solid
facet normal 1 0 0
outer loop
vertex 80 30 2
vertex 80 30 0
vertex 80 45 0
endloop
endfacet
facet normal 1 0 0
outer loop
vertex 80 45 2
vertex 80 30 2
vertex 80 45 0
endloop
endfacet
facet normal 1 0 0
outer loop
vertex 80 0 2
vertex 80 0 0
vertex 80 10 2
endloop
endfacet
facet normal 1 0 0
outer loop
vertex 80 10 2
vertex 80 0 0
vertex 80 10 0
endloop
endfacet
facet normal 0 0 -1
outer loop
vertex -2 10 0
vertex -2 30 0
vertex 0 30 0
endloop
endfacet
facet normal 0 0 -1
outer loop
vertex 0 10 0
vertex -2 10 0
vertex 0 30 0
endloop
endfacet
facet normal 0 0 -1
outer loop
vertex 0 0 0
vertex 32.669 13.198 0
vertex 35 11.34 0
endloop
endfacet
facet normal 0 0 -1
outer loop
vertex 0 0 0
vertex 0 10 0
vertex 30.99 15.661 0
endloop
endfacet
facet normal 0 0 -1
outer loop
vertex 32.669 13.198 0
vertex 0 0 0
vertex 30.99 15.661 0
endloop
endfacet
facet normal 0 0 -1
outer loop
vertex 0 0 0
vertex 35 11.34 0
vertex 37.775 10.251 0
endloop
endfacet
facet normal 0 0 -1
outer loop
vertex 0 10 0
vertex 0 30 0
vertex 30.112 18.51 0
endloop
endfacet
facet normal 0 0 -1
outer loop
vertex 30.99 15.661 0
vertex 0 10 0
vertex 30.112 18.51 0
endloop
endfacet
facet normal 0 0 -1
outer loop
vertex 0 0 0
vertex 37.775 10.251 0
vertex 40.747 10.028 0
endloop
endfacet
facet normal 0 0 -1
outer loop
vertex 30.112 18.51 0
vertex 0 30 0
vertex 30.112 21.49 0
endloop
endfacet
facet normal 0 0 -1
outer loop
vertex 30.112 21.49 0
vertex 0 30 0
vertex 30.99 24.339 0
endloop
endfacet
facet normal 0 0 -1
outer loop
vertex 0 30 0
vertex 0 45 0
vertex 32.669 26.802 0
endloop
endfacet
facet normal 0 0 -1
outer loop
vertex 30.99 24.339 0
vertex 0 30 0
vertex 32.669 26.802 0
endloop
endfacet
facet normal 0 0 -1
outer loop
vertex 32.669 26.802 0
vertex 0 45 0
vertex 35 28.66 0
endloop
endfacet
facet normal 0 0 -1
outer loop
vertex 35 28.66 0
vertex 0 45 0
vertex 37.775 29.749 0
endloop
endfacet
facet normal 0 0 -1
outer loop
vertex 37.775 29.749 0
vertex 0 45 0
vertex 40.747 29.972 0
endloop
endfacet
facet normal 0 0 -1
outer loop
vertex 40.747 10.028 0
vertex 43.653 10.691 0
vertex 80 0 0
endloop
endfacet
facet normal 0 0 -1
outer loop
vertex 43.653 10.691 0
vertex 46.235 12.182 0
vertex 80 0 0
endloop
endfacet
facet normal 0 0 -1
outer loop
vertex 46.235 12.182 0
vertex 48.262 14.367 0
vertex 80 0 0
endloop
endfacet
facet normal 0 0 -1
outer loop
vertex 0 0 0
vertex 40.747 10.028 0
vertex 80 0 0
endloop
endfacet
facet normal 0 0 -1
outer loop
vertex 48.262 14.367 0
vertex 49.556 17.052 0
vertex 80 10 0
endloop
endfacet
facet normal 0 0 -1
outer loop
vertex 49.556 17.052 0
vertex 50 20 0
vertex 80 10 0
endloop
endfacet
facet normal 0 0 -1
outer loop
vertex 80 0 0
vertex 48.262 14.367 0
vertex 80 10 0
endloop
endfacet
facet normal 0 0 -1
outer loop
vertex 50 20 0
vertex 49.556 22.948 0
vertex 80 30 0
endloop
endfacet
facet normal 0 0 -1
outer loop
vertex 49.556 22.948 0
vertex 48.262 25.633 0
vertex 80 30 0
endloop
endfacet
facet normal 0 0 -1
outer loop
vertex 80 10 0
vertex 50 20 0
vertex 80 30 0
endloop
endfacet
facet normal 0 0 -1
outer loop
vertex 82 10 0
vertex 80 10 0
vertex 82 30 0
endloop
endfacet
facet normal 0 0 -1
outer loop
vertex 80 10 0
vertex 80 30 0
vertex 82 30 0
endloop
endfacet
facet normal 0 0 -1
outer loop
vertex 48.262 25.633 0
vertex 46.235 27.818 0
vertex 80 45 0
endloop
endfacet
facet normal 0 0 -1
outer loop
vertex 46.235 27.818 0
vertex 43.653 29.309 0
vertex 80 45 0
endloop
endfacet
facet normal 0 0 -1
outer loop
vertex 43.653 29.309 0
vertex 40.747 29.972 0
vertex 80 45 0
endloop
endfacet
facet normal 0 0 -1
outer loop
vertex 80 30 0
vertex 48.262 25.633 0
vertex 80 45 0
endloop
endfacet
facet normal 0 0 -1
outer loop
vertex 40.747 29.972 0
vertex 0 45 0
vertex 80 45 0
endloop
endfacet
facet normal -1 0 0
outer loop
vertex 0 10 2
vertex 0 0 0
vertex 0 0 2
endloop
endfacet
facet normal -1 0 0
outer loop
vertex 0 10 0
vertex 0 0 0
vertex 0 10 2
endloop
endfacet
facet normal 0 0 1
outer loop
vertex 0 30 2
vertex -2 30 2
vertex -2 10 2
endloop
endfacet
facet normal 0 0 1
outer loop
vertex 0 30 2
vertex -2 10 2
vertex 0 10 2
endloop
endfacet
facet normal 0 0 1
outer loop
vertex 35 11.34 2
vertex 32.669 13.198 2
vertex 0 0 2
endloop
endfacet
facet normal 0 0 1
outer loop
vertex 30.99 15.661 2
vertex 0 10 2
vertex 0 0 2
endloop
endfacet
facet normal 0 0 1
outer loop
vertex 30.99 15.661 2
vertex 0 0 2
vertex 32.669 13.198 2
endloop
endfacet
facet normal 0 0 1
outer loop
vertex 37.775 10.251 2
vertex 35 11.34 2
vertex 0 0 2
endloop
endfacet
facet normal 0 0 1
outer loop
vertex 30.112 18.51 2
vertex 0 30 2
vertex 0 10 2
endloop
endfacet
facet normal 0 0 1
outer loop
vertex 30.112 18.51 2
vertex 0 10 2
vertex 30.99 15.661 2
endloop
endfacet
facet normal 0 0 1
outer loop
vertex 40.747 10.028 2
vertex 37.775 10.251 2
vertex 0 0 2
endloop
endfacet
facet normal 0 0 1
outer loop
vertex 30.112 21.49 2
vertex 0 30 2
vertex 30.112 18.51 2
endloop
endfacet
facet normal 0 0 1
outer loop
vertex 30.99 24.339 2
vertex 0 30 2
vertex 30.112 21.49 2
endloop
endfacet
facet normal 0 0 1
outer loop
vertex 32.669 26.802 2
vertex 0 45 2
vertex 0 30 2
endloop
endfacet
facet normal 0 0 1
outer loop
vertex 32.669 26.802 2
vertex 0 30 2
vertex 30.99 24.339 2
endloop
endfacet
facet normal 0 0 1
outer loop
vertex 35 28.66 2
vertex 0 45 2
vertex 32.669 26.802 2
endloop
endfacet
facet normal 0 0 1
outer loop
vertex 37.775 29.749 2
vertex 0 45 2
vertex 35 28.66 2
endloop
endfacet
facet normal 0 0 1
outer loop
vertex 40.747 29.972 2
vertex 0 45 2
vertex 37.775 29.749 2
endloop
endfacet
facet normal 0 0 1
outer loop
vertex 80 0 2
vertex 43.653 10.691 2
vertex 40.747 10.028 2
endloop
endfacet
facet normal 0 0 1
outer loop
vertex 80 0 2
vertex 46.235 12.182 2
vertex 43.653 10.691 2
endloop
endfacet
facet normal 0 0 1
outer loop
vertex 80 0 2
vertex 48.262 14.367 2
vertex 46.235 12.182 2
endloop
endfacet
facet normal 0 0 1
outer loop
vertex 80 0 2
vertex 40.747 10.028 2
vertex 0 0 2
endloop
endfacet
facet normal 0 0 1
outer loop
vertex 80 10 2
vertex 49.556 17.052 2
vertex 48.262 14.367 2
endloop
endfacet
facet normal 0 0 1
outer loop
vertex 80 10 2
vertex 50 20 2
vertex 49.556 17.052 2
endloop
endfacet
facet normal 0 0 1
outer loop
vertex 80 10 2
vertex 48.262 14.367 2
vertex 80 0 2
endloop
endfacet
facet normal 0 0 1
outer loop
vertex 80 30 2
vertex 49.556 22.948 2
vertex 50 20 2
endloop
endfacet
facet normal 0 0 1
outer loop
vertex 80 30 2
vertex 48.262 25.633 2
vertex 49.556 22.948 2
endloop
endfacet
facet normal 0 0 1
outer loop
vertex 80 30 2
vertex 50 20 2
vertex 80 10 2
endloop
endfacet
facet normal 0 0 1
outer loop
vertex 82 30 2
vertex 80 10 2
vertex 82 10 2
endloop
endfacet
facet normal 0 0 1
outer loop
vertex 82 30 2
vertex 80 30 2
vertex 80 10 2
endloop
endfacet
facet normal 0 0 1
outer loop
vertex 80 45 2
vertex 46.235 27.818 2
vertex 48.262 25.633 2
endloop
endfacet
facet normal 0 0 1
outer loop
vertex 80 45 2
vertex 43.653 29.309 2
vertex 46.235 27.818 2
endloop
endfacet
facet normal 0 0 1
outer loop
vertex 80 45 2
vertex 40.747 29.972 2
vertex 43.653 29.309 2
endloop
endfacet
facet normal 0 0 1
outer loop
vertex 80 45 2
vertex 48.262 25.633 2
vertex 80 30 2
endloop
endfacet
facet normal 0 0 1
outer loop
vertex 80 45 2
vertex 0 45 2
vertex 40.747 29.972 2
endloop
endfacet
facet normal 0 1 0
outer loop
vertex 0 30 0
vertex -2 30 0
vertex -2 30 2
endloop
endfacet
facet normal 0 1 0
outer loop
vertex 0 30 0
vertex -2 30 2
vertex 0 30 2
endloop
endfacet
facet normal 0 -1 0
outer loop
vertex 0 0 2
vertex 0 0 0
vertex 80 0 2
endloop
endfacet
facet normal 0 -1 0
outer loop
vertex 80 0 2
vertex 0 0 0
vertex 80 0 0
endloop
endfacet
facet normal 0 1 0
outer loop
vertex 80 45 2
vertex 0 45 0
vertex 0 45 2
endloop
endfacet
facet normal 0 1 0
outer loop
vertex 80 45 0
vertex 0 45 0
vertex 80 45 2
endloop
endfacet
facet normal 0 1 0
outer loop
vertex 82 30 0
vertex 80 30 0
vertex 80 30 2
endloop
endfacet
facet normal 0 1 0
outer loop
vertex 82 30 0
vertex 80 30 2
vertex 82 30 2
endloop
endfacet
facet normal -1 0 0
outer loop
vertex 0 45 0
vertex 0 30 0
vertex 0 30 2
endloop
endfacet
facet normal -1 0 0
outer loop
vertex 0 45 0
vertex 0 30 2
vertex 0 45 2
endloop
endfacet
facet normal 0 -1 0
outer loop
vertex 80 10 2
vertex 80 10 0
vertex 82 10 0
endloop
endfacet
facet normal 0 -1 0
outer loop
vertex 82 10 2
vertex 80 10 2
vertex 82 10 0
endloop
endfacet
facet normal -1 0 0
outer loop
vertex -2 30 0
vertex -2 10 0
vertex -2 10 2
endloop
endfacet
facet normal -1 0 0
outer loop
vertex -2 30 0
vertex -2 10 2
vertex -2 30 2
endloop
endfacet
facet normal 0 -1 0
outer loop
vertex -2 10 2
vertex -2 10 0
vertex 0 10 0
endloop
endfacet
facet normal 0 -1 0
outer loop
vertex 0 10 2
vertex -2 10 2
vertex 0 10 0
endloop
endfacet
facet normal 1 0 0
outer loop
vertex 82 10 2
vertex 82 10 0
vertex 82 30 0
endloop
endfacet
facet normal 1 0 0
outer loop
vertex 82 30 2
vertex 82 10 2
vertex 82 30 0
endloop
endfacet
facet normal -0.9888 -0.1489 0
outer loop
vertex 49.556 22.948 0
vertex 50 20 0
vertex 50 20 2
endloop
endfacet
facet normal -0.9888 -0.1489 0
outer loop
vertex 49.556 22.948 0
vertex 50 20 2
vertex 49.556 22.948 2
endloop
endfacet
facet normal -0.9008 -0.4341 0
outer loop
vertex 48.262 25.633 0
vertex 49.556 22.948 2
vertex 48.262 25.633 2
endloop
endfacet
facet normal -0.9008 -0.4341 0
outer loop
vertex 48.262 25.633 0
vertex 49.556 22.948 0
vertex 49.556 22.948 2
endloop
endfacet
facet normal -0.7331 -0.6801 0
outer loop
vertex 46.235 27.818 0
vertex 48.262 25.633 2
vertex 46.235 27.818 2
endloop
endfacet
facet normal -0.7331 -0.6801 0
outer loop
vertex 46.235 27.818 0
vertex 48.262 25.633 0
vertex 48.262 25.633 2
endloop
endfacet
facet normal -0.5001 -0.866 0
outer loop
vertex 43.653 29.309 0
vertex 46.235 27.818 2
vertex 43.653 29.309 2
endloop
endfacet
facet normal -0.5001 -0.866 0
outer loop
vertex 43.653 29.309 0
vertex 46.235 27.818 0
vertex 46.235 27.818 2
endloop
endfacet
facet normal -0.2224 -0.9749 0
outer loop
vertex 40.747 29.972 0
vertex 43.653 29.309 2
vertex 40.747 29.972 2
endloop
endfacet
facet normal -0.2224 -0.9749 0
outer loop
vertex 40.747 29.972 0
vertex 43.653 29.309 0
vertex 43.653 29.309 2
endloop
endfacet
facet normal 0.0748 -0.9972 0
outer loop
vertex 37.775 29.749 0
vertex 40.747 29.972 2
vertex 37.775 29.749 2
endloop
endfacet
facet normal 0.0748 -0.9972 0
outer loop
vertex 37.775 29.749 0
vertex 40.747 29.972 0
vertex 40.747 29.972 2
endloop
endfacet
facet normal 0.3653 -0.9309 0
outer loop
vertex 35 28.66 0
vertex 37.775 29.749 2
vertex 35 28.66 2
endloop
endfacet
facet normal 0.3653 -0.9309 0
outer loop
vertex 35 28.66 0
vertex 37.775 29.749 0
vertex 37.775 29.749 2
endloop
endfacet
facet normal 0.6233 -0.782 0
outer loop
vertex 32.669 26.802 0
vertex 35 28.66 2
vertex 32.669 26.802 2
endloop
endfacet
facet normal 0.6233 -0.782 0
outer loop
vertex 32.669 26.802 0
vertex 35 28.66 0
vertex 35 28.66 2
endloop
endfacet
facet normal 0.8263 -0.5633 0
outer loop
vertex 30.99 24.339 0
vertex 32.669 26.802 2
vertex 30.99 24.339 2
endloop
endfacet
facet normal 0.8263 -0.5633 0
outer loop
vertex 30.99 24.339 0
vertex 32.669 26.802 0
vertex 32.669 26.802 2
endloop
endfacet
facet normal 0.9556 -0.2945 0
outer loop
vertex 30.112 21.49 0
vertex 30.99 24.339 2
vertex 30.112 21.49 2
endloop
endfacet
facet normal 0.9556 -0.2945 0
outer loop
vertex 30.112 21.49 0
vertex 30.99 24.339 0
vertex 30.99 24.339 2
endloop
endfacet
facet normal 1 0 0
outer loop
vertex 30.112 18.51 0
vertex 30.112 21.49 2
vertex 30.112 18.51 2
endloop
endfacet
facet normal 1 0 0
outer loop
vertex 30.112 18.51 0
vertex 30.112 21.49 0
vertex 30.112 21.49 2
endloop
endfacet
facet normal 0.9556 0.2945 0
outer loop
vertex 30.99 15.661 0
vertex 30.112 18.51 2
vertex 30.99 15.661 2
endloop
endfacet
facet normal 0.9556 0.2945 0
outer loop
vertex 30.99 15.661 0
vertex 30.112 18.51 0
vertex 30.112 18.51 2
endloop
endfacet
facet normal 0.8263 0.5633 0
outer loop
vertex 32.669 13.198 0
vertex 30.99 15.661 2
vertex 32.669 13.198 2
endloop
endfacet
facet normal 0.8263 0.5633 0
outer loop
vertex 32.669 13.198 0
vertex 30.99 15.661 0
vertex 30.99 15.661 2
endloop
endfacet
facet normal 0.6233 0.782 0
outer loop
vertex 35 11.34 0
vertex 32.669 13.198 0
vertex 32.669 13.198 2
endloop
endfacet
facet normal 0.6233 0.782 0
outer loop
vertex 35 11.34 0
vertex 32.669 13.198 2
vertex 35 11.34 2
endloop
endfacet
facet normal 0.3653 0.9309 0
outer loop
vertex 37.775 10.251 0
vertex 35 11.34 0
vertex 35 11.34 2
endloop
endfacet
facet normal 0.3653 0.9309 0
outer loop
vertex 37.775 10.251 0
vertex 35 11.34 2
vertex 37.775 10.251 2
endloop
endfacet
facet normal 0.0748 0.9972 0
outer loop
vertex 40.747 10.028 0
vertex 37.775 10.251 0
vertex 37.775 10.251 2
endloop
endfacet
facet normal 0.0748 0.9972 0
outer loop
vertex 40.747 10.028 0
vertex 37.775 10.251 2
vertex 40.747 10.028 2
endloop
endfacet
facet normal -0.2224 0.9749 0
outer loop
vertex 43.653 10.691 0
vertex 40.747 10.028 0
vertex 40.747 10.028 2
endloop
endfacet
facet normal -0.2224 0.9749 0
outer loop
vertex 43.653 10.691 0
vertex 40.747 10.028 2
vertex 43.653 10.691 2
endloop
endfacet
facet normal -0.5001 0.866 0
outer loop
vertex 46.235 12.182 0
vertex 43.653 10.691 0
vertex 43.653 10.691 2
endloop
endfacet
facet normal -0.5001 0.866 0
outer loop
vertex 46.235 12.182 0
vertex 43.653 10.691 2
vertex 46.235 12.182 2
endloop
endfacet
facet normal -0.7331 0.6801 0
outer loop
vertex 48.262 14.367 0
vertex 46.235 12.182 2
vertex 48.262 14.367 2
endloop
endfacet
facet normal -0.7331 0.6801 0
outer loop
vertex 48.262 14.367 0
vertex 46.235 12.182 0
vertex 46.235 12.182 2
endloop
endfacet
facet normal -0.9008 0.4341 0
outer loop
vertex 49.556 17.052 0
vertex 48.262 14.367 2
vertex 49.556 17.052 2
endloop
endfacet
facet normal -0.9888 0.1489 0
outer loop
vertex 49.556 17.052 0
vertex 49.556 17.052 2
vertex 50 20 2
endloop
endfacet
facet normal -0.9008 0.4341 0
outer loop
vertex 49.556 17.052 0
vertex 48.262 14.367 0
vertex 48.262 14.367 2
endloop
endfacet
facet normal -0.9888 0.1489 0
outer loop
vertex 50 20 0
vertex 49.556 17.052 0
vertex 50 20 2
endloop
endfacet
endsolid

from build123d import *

# Parameters (mm, degrees)
SKETCH_1_W      = 80
SKETCH_1_H      = 45
SKETCH_1_R      = 10
SKETCH_1_W_2    = 2
SKETCH_1_H_2    = 20
EXTRUDE_1_DEPTH = 2


with BuildPart() as part:
    # Эскиз1 → Бобышка-Вытянуть1 (new body)
    # profile 1 of 3: a face of its own
    with BuildSketch(Plane.XY):
        with Locations((40, 22.5)):
            Rectangle(SKETCH_1_W, SKETCH_1_H)
        with Locations((40, 20)):
            Circle(SKETCH_1_R, mode=Mode.SUBTRACT)
    # profile 2 of 3: a face of its own
    with BuildSketch(Plane.XY):
        with Locations((81, 20)):
            Rectangle(SKETCH_1_W_2, SKETCH_1_H_2)
    # profile 3 of 3: a face of its own
    with BuildSketch(Plane.XY):
        with Locations((-1, 20)):
            Rectangle(SKETCH_1_W_2, SKETCH_1_H_2)
    extrude(amount=EXTRUDE_1_DEPTH)


solid = part.part
